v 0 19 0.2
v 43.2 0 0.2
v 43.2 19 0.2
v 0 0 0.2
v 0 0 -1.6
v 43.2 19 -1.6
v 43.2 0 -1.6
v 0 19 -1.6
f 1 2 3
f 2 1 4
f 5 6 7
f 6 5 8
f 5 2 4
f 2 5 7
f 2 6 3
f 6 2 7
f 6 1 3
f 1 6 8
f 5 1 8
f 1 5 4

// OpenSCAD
//Download the Arduino STL File from the Arduino Page
//https://docs.arduino.cc/hardware/nano-rp2040-connect
module ArduinoNanoRP2040Connect(){
    //import("ArduinoNanoRp2040ConnectFixed.stl", convexity=300);
    translate([0, 0, -1.6]){
        cube([43.2, 19, 1.8]);
    }
}

ArduinoNanoRP2040Connect();
